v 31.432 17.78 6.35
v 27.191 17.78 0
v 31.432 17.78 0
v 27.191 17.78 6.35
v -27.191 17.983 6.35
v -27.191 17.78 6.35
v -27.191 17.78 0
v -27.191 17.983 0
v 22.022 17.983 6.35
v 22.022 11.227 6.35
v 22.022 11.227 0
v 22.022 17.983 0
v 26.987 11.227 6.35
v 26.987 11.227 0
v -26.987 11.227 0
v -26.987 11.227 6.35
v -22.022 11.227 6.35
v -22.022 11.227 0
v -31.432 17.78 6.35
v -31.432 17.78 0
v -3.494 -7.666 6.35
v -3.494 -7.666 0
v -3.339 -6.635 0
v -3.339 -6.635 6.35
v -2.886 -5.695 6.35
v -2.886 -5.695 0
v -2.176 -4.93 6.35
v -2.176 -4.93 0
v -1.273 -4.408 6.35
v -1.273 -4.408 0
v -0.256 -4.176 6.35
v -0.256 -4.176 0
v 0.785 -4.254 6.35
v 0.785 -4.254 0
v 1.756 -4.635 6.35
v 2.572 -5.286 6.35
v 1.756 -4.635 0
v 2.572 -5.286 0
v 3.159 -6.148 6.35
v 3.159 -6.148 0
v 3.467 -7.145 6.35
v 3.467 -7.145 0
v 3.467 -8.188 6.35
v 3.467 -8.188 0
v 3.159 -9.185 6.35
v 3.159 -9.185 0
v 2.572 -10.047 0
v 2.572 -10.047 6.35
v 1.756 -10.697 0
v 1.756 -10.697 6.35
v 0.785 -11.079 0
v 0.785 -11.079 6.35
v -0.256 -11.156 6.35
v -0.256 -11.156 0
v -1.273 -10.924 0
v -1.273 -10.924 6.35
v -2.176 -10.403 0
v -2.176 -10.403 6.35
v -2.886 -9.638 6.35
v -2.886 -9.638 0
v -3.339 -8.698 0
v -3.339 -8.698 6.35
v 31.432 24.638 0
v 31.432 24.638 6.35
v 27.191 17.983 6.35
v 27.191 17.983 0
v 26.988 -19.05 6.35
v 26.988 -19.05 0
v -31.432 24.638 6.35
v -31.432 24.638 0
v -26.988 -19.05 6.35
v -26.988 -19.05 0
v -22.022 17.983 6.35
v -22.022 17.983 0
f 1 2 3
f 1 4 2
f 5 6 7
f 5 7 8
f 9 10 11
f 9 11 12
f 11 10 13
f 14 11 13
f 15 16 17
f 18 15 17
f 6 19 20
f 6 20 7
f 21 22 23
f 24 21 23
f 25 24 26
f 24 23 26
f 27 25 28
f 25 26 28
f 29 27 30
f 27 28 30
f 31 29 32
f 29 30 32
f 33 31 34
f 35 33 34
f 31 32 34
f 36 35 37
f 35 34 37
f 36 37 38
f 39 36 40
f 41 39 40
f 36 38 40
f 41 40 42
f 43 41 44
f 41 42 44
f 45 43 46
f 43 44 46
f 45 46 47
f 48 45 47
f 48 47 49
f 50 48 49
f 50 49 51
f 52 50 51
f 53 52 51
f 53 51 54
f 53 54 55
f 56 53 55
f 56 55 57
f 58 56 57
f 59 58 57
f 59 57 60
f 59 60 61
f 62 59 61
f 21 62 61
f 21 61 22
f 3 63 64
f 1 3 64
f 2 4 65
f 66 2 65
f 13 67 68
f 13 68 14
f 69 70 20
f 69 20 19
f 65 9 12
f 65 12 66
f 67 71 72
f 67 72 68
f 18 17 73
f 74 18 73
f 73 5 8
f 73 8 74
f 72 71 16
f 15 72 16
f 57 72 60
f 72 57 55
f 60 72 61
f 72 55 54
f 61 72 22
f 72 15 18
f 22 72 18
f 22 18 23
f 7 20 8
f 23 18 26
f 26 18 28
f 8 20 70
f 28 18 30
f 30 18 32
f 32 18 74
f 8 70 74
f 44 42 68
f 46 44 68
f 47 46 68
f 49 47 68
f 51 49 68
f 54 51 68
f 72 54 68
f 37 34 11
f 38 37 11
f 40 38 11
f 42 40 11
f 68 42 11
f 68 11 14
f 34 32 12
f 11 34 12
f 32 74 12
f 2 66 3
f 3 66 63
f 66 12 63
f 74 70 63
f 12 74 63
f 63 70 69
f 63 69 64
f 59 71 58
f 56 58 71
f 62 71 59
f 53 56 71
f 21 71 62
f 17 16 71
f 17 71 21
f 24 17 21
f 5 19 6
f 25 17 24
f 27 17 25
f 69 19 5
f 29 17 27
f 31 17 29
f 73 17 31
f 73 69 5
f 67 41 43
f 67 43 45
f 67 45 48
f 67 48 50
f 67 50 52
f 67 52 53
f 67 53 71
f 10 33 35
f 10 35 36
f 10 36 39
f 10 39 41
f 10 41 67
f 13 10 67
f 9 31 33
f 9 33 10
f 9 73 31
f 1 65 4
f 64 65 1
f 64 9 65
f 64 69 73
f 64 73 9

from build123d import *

# Parameters (mm, degrees)
SKETCH1_W            = 85.725
SKETCH1_H            = 50.8
BOSS_EXTRUDE1_DEPTH  = 6.35
SKETCH2_W            = 15.875
SKETCH2_H            = 43.18
CUT_EXTRUDE1_DEPTH   = 6.35
SKETCH3_W            = 85.725
SKETCH3_H            = 6.35
CUT_EXTRUDE2_DEPTH   = 0.762
SKETCH5_W            = 6.35
SKETCH5_H            = 6.35
CUT_EXTRUDE3_DEPTH   = 4.7625
SKETCH7_W            = 6.35
SKETCH7_H            = 6.858
CUT_EXTRUDE5_DEPTH   = 11.43
SKETCH8_W            = 53.975
SKETCH8_H            = 6.35
CUT_EXTRUDE6_DEPTH   = 6.35
M6_CLEARANCE_HOLE1_D = 7
SKETCH12_W           = 5.1689
SKETCH12_H           = 6.7564
CUT_EXTRUDE7_DEPTH   = 41.439530169


with BuildPart() as part:
    # Sketch1 → Boss-Extrude1 (new body)
    with BuildSketch(Plane.XY):
        Rectangle(SKETCH1_W, SKETCH1_H)
    extrude(amount=BOSS_EXTRUDE1_DEPTH)

    # Sketch2 → Cut-Extrude1 (cut)
    with BuildSketch(Plane.XY.offset(6.35)):
        with Locations((-34.925, -3.81)):
            Rectangle(SKETCH2_W, SKETCH2_H)
        with Locations((34.925, -3.81)):
            Rectangle(SKETCH2_W, SKETCH2_H)
    extrude(amount=-CUT_EXTRUDE1_DEPTH, mode=Mode.SUBTRACT)

    # Sketch3 → Cut-Extrude2 (cut)
    with BuildSketch(Plane(origin=(0, 25.4, 0), x_dir=(1, 0, 0), z_dir=(0, 1, 0))):
        with Locations((0, -3.175)):
            Rectangle(SKETCH3_W, SKETCH3_H)
    extrude(amount=-CUT_EXTRUDE2_DEPTH, mode=Mode.SUBTRACT)

    # Sketch5 → Cut-Extrude3 (cut)
    with BuildSketch(Plane.ZY.offset(26.9875)):
        with Locations((3.175, 14.605)):
            Rectangle(SKETCH5_W, SKETCH5_H)
    cut_extrude3 = extrude(amount=-CUT_EXTRUDE3_DEPTH, mode=Mode.SUBTRACT)

    # Mirror1: Cut-Extrude3 across plane
    add(cut_extrude3.mirror(Plane(origin=(0, 0, 0), x_dir=(0, 0, 1), z_dir=(1, 0, 0))), mode=Mode.SUBTRACT)

    # Sketch7 → Cut-Extrude5 (cut)
    with BuildSketch(Plane.ZY.offset(42.8625)):
        with Locations((3.175, 21.209)):
            Rectangle(SKETCH7_W, SKETCH7_H)
    cut_extrude5 = extrude(amount=-CUT_EXTRUDE5_DEPTH, mode=Mode.SUBTRACT)

    # Mirror2: Cut-Extrude5 across plane
    add(cut_extrude5.mirror(Plane(origin=(0, 0, 0), x_dir=(0, 0, 1), z_dir=(1, 0, 0))), mode=Mode.SUBTRACT)

    # Sketch8 → Cut-Extrude6 (cut)
    with BuildSketch(Plane.XZ.offset(25.4)):
        with Locations((0, 3.175)):
            Rectangle(SKETCH8_W, SKETCH8_H)
    extrude(amount=-CUT_EXTRUDE6_DEPTH, mode=Mode.SUBTRACT)

    # M6 Clearance Hole1 (through all)
    with Locations(Plane.XY.offset(6.35)):
        with Locations((0.00592, -7.666260004)):
            Hole(M6_CLEARANCE_HOLE1_D / 2)

    # Sketch12 → Cut-Extrude7 (cut, through all)
    with BuildSketch(Plane.XY.offset(6.35)):
        with Locations((-24.60625, 14.605)):
            Rectangle(SKETCH12_W, SKETCH12_H)
        with Locations((24.60625, 14.605)):
            Rectangle(SKETCH12_W, SKETCH12_H)
    extrude(amount=-CUT_EXTRUDE7_DEPTH, mode=Mode.SUBTRACT)


solid = part.part
